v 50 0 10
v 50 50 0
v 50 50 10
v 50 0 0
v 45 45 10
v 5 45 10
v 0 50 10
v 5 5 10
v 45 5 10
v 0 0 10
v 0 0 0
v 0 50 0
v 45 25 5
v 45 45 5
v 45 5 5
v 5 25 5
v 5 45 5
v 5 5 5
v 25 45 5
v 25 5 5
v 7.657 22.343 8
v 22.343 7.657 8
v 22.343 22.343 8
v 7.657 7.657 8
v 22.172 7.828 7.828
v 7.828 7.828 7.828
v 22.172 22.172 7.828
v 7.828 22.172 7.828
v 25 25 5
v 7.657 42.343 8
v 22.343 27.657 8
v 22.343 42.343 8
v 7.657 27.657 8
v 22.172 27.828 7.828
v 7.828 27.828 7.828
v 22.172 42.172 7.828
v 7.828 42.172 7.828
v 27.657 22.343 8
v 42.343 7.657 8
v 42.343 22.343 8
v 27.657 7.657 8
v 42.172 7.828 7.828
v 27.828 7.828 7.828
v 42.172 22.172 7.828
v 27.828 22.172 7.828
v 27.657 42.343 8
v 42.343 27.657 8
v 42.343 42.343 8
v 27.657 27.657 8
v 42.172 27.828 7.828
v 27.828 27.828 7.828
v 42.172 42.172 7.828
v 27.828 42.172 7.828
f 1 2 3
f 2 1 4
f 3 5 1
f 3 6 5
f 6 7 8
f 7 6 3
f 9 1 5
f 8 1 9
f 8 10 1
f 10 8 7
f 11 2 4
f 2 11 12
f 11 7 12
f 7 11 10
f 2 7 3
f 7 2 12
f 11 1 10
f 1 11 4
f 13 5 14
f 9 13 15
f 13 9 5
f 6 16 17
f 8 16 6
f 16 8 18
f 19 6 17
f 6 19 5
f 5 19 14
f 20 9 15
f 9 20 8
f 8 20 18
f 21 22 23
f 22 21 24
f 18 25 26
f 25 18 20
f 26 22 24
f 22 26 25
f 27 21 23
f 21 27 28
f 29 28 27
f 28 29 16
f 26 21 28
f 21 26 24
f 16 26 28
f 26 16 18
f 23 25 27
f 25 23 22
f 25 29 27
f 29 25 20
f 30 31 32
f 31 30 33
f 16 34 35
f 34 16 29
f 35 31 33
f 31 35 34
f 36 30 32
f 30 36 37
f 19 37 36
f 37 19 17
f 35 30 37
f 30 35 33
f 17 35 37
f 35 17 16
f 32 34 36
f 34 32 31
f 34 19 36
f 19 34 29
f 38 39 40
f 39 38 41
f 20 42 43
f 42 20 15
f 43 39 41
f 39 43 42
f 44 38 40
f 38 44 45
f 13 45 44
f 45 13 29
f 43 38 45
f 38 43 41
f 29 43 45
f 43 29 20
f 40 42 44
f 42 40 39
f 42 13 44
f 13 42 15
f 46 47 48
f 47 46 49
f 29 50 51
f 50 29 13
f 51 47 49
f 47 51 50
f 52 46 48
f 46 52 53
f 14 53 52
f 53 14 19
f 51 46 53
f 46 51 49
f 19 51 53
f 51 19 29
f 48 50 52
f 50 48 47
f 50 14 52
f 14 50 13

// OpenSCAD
// file: ../OpenSCAD/HourOfCode.scad
tileHeight = 5;

module tile(x, y) {

    difference() {
        difference() {
            difference(){
                difference() {
                    translate([x, y, 0])
                        cube([20,20,tileHeight]);

                translate([x , y , tileHeight-3])
                    rotate([45,0,0])
                        cube([20, 4, 4]);
                } 
            translate([x , y + 20, tileHeight-3])
                rotate([45,0,0])
                    cube([20, 4, 4]);
            }

        translate([x , y , tileHeight-3])
            rotate([45,0,90])
               cube([20, 4, 4]);
        }
        translate([x + 20, y + 0, tileHeight-3])
            rotate([45,0,90])
               cube([20, 4, 4]);
    }

}



module cog(x, y) {
    translate([x, y, 0]) {
        cube([20, 20, 1]);
        translate([10, 10, 1]) {
            scale([0.25, 0.25, 0.25]) {
                surface(file = "../OpenSCAD/HourOfCodeCog.png", center = true, convexity = 5);
            }
        }
    }
}

module cross(x, y) {
    translate([x, y, 0]) {
        cube([20, 20, 1]);
            translate([10, 10, 15]) {
            rotate([0, 0, 0]) {
                scale([0.18, 0.18, 0.15]) {
                    surface(file = "../OpenSCAD/HourOfCodeCross.png", invert = true, center = true, convexity = 5);
                }
            }
        }
    }
}

module boxes(x, y) {
    translate([x, y, 0]) {
        cube([20, 20, 1]);
        translate([6, 1, 0])
            rotate([0, 0, 45])
                cube([7, 7, 7]);
        translate([8, 11, 0])
            rotate([0, 0, 10])
                cube([7, 7, 7]);
        translate([14, 3, 0])
            rotate([0, 0, 40])
                cube([7, 7, 7]);
        translate([8, 6, 7])
            rotate([0, 0, 0])
                cube([7, 7, 7]);
    }
}

module boardTest() {
    difference() {
        cube([50, 50, 10]);
        translate([5, 5, 5])
            cube([40, 40, 6]);
    }
    translate([5, 5, 3])
        for (tx =[0:20:30]) 
            for (ty =[0:20:30]) {
                tile(tx,ty);
            }
}

module board() {
    difference() {
        cube([170, 170, 10]);
        translate([5, 5, 5])
            cube([160, 160, 6]);
    }
    translate([5, 5, 3])
        for (tx =[0:20:150]) 
            for (ty =[0:20:150]) {
                tile(tx,ty);
            }
}

module topPiece(x, y) {
    translate([x + 20, y, 8]) {
    rotate([0, 180, 0]) {
        difference() {
            translate([0, 0, 2]) 
                cube([20, 20, 6]);
            tile(0, 0);
        }
    }
}
}

/*
for (tx =[0:22:60]) {
    topPiece(tx, 0);
}
*/



/*
translate([0, 0, 0])
    color("Blue", 0.5)
        cog(0, 0);
//translate([0, 20, 0])
//    rotate([180, 0, 0])
//        topPiece(0, 0);


translate([0, -25, 0])
    color("Red", 0.5)
        cross(0, 0);
//translate([0, -5, 0])
//    rotate([180, 0, 0])
//        topPiece(0, 0);
*/


//tile(0, 0);
//board();
//boardTest();
//topPiece(0,0);
//cog(0, 0);
//cross(0, 0);



  
// main file
include <../OpenSCAD/HourOfCode.scad>;

/*
// ------------------------------------------------------------- //
// ------------------------------------------------------------- //
//                        T O    U S E  ;                        //
// 1. Create a file and add the following line at the top;       //
include <../OpenSCAD/HourOfCode.scad>; // already done in this file
// 2. Use one of the following templates;                        
//tile(x, y);   // build a tile, which a top piece can fit on
//board();      // build an 8 x 8 board of tiles
//boardTest();  // build a 2 x 2 board of tiles
//topPiece(x,0);// build a top piece, which will fit on top of the board
//cog(x, y);    // build a cog, to fit on top of a top piece (scrap metal)
//cross(x, y);  // build a cross, to fit on top of a top piece (bandit)
//boxes(x, y)   // build a pile of boxes, to fit on top of a top piece (obstacle)
// where x and y are the coordinates used to place the model (0, 0 works well)
*/
// ------------------------------------------------------------- //
// ------------------------------------------------------------- //

boardTest();
